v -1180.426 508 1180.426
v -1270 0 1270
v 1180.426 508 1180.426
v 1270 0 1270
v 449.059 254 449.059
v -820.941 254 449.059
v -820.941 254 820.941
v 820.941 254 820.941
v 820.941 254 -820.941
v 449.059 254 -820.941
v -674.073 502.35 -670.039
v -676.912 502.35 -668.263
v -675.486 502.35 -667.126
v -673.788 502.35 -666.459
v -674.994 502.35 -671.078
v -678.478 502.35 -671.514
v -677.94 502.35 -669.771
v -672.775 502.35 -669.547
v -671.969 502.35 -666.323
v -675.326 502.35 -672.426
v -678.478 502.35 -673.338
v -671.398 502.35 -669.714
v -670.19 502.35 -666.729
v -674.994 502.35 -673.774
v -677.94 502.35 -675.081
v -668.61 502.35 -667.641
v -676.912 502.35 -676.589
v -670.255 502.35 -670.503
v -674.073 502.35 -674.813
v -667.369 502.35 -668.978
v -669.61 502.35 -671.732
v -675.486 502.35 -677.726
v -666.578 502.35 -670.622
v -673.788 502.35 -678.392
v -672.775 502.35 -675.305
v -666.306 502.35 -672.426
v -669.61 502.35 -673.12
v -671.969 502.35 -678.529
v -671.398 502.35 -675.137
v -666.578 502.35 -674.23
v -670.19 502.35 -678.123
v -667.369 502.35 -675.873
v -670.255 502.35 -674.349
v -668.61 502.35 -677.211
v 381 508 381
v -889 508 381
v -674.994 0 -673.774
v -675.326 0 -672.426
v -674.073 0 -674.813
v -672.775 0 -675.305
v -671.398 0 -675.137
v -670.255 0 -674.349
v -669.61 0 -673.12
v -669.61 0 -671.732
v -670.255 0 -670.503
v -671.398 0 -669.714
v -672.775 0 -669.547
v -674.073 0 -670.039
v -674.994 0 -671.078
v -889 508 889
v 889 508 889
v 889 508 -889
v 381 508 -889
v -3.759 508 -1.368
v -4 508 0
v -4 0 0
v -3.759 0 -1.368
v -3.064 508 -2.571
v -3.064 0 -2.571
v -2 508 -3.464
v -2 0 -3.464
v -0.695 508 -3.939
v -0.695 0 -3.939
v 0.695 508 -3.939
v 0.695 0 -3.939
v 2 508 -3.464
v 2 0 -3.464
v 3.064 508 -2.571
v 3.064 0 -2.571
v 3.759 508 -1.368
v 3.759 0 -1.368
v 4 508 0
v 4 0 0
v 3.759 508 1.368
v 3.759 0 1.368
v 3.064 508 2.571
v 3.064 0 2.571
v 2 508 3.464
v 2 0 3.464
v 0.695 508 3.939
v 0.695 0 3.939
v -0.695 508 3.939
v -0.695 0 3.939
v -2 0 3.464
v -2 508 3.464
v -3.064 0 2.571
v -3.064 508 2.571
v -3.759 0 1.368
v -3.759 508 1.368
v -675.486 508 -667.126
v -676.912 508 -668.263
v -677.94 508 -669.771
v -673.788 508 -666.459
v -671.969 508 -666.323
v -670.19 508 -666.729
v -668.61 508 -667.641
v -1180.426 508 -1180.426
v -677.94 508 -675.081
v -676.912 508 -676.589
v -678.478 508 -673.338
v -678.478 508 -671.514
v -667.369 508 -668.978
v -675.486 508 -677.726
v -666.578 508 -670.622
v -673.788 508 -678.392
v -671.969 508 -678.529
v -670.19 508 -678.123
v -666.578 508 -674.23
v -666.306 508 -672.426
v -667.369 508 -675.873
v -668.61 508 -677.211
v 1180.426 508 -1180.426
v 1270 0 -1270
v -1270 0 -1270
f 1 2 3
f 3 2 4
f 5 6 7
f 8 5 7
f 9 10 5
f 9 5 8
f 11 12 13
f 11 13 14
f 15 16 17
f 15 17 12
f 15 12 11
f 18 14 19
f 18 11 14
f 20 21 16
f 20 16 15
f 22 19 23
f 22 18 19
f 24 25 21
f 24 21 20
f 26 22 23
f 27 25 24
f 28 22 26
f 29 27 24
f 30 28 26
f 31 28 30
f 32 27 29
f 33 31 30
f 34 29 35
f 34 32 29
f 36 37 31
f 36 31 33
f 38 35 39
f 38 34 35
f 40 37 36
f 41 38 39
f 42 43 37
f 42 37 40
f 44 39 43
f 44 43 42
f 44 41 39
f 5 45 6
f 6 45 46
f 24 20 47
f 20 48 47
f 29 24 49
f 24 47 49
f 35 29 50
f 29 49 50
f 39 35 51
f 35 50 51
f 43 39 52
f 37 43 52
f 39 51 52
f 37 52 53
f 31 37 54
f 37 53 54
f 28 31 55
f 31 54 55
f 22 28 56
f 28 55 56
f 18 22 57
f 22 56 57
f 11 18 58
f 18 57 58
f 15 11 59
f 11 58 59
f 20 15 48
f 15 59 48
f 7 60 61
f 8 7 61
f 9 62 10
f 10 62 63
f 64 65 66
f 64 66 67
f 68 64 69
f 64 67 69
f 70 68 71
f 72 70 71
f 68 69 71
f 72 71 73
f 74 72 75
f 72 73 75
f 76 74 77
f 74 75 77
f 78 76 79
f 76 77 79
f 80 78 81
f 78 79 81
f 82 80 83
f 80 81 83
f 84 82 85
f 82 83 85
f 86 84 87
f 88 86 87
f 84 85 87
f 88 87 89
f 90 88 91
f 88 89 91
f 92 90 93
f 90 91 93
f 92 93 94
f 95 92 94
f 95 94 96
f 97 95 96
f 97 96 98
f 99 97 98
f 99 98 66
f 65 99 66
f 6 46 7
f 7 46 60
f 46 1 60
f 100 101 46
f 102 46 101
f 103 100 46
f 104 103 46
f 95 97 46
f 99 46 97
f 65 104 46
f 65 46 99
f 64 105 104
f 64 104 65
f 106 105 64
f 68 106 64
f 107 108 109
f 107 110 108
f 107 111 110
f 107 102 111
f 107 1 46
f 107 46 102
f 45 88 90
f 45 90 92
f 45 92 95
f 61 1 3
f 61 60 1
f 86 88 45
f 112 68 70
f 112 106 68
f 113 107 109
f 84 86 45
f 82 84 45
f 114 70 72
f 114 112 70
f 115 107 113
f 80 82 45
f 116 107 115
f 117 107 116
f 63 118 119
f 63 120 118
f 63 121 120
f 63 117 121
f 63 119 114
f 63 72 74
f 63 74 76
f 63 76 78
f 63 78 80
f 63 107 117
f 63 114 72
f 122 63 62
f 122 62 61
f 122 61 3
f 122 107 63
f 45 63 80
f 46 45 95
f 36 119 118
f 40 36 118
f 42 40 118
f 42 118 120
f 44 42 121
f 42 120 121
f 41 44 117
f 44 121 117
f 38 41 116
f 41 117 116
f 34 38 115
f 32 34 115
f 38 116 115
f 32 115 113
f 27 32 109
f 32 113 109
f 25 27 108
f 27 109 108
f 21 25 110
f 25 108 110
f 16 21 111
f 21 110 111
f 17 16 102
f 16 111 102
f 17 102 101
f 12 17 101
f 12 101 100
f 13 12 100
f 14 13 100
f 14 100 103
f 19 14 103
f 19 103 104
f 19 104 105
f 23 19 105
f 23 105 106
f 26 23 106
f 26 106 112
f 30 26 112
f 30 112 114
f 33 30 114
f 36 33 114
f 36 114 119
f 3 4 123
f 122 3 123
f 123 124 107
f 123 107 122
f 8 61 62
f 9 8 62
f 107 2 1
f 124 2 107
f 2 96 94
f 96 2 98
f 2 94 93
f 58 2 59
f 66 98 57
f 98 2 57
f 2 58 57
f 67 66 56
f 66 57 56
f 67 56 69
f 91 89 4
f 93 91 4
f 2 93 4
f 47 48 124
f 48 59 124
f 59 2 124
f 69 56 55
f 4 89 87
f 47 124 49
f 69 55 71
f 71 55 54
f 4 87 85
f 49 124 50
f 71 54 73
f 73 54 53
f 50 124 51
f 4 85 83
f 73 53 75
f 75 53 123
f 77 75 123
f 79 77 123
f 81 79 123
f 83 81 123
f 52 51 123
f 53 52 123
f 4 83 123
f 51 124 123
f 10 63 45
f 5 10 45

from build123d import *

# Parameters (mm, degrees)
SKETCH2_W                                    = 2540
SKETCH2_H                                    = 2540
BOSS_EXTRUDE1_DEPTH                          = 508
CUT_EXTRUDE2_DEPTH                           = 254
DRAFT3_ANGLE                                 = 15
DRAFT4_ANGLE                                 = -10
CBORE_FOR_M5_HEX_HEAD_CAP_SCREW1_D           = 5.8
CBORE_FOR_M5_HEX_HEAD_CAP_SCREW1_CBORE_D     = 12.24
CBORE_FOR_M5_HEX_HEAD_CAP_SCREW1_CBORE_DEPTH = 5.65
F_8_0MM_DOWEL_HOLE1_D                        = 8


with BuildPart() as part:
    # Sketch2 → Boss-Extrude1 (new body)
    with BuildSketch(Plane(origin=(0, 0, 0), x_dir=(1, 0, 0), z_dir=(0, 1, 0))):
        Rectangle(SKETCH2_W, SKETCH2_H)
    extrude(amount=BOSS_EXTRUDE1_DEPTH)

    # Sketch3 → Cut-Extrude2 (cut)
    with BuildSketch(Plane(origin=(0, 508, 0), x_dir=(1, 0, 0), z_dir=(0, 1, 0))):
        Polygon((381, 889), (381, -381), (-889, -381), (-889, -889), (889, -889), (889, 889), align=None)
    extrude(amount=-CUT_EXTRUDE2_DEPTH, mode=Mode.SUBTRACT)

    # Draft3
    draft3_faces = [part.faces().sort_by_distance(p)[0] for p in [
        (381, 381, -254),
        (-254, 381, 381),
        (-889, 381, 635),
        (0, 381, 889),
        (889, 381, 0),
        (635, 381, -889),
    ]]
    draft(draft3_faces, Plane.ZX.offset(508), DRAFT3_ANGLE)

    # Draft4
    draft4_faces = [part.faces().sort_by_distance(p)[0] for p in [
        (-1270, 254, 0),
        (0, 254, -1270),
        (1270, 254, 0),
        (0, 254, 1270),
    ]]
    draft(draft4_faces, Plane(origin=(0, 0, 0), x_dir=(0, 0, -1), z_dir=(0, -1, 0)), DRAFT4_ANGLE)

    # CBORE for M5 Hex Head Cap Screw1 (through all)
    with Locations(Plane(origin=(0, 508, 0), x_dir=(1, 0, 0), z_dir=(0, 1, 0))):
        with Locations((-672.4258938, 672.4258938)):
            CounterBoreHole(CBORE_FOR_M5_HEX_HEAD_CAP_SCREW1_D / 2, CBORE_FOR_M5_HEX_HEAD_CAP_SCREW1_CBORE_D / 2, CBORE_FOR_M5_HEX_HEAD_CAP_SCREW1_CBORE_DEPTH)

    # Ø8.0mm Dowel Hole1 (through all)
    with Locations(Plane(origin=(0, 508, 0), x_dir=(1, 0, 0), z_dir=(0, 1, 0))):
        with Locations((0, 0)):
            Hole(F_8_0MM_DOWEL_HOLE1_D / 2)


solid = part.part
